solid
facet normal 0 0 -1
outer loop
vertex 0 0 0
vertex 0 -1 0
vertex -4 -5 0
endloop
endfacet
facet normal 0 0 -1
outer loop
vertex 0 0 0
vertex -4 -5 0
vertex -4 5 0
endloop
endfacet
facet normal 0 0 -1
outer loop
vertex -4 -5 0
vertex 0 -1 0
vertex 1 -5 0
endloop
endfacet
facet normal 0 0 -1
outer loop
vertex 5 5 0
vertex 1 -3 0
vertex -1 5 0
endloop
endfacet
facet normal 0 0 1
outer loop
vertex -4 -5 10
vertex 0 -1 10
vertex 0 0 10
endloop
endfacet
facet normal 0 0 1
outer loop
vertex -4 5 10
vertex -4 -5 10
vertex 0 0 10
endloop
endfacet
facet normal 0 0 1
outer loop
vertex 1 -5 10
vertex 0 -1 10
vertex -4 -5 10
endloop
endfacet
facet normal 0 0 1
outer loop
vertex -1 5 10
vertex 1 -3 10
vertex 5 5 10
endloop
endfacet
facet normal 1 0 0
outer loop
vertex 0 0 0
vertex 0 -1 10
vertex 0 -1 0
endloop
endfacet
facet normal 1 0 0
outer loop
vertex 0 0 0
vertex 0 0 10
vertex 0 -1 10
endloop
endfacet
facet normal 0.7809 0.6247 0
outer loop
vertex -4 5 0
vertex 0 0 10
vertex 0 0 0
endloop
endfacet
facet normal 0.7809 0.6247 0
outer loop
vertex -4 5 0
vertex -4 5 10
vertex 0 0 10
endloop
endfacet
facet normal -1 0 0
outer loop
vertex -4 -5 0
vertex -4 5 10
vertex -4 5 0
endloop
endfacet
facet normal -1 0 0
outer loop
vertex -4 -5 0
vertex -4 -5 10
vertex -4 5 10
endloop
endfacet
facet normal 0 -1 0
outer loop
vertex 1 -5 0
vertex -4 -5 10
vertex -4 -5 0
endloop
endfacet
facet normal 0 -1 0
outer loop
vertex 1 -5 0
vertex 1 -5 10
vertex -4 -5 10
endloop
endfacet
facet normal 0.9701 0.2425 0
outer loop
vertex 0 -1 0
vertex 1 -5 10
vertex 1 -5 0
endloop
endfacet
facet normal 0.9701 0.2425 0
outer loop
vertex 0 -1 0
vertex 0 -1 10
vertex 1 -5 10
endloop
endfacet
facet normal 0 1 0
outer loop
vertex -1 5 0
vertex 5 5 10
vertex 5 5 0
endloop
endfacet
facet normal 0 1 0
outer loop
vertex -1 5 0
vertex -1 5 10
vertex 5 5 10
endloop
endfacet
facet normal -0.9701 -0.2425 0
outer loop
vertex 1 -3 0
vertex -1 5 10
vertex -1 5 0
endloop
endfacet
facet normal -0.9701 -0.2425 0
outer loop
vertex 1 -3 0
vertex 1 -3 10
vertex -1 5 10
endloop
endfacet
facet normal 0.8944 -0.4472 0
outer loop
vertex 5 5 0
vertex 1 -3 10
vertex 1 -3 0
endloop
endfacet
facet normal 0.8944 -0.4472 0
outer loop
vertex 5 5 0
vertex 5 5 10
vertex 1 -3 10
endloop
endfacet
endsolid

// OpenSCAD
/* use with -gran=0.5 */
linear_extrude(height = 10) {
    polygon(
        points=[
            [ 0, 0],
            [ 0, -1],
            [ 1, -5],
            [-4, -5],
            [-4, +5],
        ]
    );
    polygon(
        points=[
            [-1, +5],
            [+1, -3],
            [+5, +5]
        ]
    );
}
